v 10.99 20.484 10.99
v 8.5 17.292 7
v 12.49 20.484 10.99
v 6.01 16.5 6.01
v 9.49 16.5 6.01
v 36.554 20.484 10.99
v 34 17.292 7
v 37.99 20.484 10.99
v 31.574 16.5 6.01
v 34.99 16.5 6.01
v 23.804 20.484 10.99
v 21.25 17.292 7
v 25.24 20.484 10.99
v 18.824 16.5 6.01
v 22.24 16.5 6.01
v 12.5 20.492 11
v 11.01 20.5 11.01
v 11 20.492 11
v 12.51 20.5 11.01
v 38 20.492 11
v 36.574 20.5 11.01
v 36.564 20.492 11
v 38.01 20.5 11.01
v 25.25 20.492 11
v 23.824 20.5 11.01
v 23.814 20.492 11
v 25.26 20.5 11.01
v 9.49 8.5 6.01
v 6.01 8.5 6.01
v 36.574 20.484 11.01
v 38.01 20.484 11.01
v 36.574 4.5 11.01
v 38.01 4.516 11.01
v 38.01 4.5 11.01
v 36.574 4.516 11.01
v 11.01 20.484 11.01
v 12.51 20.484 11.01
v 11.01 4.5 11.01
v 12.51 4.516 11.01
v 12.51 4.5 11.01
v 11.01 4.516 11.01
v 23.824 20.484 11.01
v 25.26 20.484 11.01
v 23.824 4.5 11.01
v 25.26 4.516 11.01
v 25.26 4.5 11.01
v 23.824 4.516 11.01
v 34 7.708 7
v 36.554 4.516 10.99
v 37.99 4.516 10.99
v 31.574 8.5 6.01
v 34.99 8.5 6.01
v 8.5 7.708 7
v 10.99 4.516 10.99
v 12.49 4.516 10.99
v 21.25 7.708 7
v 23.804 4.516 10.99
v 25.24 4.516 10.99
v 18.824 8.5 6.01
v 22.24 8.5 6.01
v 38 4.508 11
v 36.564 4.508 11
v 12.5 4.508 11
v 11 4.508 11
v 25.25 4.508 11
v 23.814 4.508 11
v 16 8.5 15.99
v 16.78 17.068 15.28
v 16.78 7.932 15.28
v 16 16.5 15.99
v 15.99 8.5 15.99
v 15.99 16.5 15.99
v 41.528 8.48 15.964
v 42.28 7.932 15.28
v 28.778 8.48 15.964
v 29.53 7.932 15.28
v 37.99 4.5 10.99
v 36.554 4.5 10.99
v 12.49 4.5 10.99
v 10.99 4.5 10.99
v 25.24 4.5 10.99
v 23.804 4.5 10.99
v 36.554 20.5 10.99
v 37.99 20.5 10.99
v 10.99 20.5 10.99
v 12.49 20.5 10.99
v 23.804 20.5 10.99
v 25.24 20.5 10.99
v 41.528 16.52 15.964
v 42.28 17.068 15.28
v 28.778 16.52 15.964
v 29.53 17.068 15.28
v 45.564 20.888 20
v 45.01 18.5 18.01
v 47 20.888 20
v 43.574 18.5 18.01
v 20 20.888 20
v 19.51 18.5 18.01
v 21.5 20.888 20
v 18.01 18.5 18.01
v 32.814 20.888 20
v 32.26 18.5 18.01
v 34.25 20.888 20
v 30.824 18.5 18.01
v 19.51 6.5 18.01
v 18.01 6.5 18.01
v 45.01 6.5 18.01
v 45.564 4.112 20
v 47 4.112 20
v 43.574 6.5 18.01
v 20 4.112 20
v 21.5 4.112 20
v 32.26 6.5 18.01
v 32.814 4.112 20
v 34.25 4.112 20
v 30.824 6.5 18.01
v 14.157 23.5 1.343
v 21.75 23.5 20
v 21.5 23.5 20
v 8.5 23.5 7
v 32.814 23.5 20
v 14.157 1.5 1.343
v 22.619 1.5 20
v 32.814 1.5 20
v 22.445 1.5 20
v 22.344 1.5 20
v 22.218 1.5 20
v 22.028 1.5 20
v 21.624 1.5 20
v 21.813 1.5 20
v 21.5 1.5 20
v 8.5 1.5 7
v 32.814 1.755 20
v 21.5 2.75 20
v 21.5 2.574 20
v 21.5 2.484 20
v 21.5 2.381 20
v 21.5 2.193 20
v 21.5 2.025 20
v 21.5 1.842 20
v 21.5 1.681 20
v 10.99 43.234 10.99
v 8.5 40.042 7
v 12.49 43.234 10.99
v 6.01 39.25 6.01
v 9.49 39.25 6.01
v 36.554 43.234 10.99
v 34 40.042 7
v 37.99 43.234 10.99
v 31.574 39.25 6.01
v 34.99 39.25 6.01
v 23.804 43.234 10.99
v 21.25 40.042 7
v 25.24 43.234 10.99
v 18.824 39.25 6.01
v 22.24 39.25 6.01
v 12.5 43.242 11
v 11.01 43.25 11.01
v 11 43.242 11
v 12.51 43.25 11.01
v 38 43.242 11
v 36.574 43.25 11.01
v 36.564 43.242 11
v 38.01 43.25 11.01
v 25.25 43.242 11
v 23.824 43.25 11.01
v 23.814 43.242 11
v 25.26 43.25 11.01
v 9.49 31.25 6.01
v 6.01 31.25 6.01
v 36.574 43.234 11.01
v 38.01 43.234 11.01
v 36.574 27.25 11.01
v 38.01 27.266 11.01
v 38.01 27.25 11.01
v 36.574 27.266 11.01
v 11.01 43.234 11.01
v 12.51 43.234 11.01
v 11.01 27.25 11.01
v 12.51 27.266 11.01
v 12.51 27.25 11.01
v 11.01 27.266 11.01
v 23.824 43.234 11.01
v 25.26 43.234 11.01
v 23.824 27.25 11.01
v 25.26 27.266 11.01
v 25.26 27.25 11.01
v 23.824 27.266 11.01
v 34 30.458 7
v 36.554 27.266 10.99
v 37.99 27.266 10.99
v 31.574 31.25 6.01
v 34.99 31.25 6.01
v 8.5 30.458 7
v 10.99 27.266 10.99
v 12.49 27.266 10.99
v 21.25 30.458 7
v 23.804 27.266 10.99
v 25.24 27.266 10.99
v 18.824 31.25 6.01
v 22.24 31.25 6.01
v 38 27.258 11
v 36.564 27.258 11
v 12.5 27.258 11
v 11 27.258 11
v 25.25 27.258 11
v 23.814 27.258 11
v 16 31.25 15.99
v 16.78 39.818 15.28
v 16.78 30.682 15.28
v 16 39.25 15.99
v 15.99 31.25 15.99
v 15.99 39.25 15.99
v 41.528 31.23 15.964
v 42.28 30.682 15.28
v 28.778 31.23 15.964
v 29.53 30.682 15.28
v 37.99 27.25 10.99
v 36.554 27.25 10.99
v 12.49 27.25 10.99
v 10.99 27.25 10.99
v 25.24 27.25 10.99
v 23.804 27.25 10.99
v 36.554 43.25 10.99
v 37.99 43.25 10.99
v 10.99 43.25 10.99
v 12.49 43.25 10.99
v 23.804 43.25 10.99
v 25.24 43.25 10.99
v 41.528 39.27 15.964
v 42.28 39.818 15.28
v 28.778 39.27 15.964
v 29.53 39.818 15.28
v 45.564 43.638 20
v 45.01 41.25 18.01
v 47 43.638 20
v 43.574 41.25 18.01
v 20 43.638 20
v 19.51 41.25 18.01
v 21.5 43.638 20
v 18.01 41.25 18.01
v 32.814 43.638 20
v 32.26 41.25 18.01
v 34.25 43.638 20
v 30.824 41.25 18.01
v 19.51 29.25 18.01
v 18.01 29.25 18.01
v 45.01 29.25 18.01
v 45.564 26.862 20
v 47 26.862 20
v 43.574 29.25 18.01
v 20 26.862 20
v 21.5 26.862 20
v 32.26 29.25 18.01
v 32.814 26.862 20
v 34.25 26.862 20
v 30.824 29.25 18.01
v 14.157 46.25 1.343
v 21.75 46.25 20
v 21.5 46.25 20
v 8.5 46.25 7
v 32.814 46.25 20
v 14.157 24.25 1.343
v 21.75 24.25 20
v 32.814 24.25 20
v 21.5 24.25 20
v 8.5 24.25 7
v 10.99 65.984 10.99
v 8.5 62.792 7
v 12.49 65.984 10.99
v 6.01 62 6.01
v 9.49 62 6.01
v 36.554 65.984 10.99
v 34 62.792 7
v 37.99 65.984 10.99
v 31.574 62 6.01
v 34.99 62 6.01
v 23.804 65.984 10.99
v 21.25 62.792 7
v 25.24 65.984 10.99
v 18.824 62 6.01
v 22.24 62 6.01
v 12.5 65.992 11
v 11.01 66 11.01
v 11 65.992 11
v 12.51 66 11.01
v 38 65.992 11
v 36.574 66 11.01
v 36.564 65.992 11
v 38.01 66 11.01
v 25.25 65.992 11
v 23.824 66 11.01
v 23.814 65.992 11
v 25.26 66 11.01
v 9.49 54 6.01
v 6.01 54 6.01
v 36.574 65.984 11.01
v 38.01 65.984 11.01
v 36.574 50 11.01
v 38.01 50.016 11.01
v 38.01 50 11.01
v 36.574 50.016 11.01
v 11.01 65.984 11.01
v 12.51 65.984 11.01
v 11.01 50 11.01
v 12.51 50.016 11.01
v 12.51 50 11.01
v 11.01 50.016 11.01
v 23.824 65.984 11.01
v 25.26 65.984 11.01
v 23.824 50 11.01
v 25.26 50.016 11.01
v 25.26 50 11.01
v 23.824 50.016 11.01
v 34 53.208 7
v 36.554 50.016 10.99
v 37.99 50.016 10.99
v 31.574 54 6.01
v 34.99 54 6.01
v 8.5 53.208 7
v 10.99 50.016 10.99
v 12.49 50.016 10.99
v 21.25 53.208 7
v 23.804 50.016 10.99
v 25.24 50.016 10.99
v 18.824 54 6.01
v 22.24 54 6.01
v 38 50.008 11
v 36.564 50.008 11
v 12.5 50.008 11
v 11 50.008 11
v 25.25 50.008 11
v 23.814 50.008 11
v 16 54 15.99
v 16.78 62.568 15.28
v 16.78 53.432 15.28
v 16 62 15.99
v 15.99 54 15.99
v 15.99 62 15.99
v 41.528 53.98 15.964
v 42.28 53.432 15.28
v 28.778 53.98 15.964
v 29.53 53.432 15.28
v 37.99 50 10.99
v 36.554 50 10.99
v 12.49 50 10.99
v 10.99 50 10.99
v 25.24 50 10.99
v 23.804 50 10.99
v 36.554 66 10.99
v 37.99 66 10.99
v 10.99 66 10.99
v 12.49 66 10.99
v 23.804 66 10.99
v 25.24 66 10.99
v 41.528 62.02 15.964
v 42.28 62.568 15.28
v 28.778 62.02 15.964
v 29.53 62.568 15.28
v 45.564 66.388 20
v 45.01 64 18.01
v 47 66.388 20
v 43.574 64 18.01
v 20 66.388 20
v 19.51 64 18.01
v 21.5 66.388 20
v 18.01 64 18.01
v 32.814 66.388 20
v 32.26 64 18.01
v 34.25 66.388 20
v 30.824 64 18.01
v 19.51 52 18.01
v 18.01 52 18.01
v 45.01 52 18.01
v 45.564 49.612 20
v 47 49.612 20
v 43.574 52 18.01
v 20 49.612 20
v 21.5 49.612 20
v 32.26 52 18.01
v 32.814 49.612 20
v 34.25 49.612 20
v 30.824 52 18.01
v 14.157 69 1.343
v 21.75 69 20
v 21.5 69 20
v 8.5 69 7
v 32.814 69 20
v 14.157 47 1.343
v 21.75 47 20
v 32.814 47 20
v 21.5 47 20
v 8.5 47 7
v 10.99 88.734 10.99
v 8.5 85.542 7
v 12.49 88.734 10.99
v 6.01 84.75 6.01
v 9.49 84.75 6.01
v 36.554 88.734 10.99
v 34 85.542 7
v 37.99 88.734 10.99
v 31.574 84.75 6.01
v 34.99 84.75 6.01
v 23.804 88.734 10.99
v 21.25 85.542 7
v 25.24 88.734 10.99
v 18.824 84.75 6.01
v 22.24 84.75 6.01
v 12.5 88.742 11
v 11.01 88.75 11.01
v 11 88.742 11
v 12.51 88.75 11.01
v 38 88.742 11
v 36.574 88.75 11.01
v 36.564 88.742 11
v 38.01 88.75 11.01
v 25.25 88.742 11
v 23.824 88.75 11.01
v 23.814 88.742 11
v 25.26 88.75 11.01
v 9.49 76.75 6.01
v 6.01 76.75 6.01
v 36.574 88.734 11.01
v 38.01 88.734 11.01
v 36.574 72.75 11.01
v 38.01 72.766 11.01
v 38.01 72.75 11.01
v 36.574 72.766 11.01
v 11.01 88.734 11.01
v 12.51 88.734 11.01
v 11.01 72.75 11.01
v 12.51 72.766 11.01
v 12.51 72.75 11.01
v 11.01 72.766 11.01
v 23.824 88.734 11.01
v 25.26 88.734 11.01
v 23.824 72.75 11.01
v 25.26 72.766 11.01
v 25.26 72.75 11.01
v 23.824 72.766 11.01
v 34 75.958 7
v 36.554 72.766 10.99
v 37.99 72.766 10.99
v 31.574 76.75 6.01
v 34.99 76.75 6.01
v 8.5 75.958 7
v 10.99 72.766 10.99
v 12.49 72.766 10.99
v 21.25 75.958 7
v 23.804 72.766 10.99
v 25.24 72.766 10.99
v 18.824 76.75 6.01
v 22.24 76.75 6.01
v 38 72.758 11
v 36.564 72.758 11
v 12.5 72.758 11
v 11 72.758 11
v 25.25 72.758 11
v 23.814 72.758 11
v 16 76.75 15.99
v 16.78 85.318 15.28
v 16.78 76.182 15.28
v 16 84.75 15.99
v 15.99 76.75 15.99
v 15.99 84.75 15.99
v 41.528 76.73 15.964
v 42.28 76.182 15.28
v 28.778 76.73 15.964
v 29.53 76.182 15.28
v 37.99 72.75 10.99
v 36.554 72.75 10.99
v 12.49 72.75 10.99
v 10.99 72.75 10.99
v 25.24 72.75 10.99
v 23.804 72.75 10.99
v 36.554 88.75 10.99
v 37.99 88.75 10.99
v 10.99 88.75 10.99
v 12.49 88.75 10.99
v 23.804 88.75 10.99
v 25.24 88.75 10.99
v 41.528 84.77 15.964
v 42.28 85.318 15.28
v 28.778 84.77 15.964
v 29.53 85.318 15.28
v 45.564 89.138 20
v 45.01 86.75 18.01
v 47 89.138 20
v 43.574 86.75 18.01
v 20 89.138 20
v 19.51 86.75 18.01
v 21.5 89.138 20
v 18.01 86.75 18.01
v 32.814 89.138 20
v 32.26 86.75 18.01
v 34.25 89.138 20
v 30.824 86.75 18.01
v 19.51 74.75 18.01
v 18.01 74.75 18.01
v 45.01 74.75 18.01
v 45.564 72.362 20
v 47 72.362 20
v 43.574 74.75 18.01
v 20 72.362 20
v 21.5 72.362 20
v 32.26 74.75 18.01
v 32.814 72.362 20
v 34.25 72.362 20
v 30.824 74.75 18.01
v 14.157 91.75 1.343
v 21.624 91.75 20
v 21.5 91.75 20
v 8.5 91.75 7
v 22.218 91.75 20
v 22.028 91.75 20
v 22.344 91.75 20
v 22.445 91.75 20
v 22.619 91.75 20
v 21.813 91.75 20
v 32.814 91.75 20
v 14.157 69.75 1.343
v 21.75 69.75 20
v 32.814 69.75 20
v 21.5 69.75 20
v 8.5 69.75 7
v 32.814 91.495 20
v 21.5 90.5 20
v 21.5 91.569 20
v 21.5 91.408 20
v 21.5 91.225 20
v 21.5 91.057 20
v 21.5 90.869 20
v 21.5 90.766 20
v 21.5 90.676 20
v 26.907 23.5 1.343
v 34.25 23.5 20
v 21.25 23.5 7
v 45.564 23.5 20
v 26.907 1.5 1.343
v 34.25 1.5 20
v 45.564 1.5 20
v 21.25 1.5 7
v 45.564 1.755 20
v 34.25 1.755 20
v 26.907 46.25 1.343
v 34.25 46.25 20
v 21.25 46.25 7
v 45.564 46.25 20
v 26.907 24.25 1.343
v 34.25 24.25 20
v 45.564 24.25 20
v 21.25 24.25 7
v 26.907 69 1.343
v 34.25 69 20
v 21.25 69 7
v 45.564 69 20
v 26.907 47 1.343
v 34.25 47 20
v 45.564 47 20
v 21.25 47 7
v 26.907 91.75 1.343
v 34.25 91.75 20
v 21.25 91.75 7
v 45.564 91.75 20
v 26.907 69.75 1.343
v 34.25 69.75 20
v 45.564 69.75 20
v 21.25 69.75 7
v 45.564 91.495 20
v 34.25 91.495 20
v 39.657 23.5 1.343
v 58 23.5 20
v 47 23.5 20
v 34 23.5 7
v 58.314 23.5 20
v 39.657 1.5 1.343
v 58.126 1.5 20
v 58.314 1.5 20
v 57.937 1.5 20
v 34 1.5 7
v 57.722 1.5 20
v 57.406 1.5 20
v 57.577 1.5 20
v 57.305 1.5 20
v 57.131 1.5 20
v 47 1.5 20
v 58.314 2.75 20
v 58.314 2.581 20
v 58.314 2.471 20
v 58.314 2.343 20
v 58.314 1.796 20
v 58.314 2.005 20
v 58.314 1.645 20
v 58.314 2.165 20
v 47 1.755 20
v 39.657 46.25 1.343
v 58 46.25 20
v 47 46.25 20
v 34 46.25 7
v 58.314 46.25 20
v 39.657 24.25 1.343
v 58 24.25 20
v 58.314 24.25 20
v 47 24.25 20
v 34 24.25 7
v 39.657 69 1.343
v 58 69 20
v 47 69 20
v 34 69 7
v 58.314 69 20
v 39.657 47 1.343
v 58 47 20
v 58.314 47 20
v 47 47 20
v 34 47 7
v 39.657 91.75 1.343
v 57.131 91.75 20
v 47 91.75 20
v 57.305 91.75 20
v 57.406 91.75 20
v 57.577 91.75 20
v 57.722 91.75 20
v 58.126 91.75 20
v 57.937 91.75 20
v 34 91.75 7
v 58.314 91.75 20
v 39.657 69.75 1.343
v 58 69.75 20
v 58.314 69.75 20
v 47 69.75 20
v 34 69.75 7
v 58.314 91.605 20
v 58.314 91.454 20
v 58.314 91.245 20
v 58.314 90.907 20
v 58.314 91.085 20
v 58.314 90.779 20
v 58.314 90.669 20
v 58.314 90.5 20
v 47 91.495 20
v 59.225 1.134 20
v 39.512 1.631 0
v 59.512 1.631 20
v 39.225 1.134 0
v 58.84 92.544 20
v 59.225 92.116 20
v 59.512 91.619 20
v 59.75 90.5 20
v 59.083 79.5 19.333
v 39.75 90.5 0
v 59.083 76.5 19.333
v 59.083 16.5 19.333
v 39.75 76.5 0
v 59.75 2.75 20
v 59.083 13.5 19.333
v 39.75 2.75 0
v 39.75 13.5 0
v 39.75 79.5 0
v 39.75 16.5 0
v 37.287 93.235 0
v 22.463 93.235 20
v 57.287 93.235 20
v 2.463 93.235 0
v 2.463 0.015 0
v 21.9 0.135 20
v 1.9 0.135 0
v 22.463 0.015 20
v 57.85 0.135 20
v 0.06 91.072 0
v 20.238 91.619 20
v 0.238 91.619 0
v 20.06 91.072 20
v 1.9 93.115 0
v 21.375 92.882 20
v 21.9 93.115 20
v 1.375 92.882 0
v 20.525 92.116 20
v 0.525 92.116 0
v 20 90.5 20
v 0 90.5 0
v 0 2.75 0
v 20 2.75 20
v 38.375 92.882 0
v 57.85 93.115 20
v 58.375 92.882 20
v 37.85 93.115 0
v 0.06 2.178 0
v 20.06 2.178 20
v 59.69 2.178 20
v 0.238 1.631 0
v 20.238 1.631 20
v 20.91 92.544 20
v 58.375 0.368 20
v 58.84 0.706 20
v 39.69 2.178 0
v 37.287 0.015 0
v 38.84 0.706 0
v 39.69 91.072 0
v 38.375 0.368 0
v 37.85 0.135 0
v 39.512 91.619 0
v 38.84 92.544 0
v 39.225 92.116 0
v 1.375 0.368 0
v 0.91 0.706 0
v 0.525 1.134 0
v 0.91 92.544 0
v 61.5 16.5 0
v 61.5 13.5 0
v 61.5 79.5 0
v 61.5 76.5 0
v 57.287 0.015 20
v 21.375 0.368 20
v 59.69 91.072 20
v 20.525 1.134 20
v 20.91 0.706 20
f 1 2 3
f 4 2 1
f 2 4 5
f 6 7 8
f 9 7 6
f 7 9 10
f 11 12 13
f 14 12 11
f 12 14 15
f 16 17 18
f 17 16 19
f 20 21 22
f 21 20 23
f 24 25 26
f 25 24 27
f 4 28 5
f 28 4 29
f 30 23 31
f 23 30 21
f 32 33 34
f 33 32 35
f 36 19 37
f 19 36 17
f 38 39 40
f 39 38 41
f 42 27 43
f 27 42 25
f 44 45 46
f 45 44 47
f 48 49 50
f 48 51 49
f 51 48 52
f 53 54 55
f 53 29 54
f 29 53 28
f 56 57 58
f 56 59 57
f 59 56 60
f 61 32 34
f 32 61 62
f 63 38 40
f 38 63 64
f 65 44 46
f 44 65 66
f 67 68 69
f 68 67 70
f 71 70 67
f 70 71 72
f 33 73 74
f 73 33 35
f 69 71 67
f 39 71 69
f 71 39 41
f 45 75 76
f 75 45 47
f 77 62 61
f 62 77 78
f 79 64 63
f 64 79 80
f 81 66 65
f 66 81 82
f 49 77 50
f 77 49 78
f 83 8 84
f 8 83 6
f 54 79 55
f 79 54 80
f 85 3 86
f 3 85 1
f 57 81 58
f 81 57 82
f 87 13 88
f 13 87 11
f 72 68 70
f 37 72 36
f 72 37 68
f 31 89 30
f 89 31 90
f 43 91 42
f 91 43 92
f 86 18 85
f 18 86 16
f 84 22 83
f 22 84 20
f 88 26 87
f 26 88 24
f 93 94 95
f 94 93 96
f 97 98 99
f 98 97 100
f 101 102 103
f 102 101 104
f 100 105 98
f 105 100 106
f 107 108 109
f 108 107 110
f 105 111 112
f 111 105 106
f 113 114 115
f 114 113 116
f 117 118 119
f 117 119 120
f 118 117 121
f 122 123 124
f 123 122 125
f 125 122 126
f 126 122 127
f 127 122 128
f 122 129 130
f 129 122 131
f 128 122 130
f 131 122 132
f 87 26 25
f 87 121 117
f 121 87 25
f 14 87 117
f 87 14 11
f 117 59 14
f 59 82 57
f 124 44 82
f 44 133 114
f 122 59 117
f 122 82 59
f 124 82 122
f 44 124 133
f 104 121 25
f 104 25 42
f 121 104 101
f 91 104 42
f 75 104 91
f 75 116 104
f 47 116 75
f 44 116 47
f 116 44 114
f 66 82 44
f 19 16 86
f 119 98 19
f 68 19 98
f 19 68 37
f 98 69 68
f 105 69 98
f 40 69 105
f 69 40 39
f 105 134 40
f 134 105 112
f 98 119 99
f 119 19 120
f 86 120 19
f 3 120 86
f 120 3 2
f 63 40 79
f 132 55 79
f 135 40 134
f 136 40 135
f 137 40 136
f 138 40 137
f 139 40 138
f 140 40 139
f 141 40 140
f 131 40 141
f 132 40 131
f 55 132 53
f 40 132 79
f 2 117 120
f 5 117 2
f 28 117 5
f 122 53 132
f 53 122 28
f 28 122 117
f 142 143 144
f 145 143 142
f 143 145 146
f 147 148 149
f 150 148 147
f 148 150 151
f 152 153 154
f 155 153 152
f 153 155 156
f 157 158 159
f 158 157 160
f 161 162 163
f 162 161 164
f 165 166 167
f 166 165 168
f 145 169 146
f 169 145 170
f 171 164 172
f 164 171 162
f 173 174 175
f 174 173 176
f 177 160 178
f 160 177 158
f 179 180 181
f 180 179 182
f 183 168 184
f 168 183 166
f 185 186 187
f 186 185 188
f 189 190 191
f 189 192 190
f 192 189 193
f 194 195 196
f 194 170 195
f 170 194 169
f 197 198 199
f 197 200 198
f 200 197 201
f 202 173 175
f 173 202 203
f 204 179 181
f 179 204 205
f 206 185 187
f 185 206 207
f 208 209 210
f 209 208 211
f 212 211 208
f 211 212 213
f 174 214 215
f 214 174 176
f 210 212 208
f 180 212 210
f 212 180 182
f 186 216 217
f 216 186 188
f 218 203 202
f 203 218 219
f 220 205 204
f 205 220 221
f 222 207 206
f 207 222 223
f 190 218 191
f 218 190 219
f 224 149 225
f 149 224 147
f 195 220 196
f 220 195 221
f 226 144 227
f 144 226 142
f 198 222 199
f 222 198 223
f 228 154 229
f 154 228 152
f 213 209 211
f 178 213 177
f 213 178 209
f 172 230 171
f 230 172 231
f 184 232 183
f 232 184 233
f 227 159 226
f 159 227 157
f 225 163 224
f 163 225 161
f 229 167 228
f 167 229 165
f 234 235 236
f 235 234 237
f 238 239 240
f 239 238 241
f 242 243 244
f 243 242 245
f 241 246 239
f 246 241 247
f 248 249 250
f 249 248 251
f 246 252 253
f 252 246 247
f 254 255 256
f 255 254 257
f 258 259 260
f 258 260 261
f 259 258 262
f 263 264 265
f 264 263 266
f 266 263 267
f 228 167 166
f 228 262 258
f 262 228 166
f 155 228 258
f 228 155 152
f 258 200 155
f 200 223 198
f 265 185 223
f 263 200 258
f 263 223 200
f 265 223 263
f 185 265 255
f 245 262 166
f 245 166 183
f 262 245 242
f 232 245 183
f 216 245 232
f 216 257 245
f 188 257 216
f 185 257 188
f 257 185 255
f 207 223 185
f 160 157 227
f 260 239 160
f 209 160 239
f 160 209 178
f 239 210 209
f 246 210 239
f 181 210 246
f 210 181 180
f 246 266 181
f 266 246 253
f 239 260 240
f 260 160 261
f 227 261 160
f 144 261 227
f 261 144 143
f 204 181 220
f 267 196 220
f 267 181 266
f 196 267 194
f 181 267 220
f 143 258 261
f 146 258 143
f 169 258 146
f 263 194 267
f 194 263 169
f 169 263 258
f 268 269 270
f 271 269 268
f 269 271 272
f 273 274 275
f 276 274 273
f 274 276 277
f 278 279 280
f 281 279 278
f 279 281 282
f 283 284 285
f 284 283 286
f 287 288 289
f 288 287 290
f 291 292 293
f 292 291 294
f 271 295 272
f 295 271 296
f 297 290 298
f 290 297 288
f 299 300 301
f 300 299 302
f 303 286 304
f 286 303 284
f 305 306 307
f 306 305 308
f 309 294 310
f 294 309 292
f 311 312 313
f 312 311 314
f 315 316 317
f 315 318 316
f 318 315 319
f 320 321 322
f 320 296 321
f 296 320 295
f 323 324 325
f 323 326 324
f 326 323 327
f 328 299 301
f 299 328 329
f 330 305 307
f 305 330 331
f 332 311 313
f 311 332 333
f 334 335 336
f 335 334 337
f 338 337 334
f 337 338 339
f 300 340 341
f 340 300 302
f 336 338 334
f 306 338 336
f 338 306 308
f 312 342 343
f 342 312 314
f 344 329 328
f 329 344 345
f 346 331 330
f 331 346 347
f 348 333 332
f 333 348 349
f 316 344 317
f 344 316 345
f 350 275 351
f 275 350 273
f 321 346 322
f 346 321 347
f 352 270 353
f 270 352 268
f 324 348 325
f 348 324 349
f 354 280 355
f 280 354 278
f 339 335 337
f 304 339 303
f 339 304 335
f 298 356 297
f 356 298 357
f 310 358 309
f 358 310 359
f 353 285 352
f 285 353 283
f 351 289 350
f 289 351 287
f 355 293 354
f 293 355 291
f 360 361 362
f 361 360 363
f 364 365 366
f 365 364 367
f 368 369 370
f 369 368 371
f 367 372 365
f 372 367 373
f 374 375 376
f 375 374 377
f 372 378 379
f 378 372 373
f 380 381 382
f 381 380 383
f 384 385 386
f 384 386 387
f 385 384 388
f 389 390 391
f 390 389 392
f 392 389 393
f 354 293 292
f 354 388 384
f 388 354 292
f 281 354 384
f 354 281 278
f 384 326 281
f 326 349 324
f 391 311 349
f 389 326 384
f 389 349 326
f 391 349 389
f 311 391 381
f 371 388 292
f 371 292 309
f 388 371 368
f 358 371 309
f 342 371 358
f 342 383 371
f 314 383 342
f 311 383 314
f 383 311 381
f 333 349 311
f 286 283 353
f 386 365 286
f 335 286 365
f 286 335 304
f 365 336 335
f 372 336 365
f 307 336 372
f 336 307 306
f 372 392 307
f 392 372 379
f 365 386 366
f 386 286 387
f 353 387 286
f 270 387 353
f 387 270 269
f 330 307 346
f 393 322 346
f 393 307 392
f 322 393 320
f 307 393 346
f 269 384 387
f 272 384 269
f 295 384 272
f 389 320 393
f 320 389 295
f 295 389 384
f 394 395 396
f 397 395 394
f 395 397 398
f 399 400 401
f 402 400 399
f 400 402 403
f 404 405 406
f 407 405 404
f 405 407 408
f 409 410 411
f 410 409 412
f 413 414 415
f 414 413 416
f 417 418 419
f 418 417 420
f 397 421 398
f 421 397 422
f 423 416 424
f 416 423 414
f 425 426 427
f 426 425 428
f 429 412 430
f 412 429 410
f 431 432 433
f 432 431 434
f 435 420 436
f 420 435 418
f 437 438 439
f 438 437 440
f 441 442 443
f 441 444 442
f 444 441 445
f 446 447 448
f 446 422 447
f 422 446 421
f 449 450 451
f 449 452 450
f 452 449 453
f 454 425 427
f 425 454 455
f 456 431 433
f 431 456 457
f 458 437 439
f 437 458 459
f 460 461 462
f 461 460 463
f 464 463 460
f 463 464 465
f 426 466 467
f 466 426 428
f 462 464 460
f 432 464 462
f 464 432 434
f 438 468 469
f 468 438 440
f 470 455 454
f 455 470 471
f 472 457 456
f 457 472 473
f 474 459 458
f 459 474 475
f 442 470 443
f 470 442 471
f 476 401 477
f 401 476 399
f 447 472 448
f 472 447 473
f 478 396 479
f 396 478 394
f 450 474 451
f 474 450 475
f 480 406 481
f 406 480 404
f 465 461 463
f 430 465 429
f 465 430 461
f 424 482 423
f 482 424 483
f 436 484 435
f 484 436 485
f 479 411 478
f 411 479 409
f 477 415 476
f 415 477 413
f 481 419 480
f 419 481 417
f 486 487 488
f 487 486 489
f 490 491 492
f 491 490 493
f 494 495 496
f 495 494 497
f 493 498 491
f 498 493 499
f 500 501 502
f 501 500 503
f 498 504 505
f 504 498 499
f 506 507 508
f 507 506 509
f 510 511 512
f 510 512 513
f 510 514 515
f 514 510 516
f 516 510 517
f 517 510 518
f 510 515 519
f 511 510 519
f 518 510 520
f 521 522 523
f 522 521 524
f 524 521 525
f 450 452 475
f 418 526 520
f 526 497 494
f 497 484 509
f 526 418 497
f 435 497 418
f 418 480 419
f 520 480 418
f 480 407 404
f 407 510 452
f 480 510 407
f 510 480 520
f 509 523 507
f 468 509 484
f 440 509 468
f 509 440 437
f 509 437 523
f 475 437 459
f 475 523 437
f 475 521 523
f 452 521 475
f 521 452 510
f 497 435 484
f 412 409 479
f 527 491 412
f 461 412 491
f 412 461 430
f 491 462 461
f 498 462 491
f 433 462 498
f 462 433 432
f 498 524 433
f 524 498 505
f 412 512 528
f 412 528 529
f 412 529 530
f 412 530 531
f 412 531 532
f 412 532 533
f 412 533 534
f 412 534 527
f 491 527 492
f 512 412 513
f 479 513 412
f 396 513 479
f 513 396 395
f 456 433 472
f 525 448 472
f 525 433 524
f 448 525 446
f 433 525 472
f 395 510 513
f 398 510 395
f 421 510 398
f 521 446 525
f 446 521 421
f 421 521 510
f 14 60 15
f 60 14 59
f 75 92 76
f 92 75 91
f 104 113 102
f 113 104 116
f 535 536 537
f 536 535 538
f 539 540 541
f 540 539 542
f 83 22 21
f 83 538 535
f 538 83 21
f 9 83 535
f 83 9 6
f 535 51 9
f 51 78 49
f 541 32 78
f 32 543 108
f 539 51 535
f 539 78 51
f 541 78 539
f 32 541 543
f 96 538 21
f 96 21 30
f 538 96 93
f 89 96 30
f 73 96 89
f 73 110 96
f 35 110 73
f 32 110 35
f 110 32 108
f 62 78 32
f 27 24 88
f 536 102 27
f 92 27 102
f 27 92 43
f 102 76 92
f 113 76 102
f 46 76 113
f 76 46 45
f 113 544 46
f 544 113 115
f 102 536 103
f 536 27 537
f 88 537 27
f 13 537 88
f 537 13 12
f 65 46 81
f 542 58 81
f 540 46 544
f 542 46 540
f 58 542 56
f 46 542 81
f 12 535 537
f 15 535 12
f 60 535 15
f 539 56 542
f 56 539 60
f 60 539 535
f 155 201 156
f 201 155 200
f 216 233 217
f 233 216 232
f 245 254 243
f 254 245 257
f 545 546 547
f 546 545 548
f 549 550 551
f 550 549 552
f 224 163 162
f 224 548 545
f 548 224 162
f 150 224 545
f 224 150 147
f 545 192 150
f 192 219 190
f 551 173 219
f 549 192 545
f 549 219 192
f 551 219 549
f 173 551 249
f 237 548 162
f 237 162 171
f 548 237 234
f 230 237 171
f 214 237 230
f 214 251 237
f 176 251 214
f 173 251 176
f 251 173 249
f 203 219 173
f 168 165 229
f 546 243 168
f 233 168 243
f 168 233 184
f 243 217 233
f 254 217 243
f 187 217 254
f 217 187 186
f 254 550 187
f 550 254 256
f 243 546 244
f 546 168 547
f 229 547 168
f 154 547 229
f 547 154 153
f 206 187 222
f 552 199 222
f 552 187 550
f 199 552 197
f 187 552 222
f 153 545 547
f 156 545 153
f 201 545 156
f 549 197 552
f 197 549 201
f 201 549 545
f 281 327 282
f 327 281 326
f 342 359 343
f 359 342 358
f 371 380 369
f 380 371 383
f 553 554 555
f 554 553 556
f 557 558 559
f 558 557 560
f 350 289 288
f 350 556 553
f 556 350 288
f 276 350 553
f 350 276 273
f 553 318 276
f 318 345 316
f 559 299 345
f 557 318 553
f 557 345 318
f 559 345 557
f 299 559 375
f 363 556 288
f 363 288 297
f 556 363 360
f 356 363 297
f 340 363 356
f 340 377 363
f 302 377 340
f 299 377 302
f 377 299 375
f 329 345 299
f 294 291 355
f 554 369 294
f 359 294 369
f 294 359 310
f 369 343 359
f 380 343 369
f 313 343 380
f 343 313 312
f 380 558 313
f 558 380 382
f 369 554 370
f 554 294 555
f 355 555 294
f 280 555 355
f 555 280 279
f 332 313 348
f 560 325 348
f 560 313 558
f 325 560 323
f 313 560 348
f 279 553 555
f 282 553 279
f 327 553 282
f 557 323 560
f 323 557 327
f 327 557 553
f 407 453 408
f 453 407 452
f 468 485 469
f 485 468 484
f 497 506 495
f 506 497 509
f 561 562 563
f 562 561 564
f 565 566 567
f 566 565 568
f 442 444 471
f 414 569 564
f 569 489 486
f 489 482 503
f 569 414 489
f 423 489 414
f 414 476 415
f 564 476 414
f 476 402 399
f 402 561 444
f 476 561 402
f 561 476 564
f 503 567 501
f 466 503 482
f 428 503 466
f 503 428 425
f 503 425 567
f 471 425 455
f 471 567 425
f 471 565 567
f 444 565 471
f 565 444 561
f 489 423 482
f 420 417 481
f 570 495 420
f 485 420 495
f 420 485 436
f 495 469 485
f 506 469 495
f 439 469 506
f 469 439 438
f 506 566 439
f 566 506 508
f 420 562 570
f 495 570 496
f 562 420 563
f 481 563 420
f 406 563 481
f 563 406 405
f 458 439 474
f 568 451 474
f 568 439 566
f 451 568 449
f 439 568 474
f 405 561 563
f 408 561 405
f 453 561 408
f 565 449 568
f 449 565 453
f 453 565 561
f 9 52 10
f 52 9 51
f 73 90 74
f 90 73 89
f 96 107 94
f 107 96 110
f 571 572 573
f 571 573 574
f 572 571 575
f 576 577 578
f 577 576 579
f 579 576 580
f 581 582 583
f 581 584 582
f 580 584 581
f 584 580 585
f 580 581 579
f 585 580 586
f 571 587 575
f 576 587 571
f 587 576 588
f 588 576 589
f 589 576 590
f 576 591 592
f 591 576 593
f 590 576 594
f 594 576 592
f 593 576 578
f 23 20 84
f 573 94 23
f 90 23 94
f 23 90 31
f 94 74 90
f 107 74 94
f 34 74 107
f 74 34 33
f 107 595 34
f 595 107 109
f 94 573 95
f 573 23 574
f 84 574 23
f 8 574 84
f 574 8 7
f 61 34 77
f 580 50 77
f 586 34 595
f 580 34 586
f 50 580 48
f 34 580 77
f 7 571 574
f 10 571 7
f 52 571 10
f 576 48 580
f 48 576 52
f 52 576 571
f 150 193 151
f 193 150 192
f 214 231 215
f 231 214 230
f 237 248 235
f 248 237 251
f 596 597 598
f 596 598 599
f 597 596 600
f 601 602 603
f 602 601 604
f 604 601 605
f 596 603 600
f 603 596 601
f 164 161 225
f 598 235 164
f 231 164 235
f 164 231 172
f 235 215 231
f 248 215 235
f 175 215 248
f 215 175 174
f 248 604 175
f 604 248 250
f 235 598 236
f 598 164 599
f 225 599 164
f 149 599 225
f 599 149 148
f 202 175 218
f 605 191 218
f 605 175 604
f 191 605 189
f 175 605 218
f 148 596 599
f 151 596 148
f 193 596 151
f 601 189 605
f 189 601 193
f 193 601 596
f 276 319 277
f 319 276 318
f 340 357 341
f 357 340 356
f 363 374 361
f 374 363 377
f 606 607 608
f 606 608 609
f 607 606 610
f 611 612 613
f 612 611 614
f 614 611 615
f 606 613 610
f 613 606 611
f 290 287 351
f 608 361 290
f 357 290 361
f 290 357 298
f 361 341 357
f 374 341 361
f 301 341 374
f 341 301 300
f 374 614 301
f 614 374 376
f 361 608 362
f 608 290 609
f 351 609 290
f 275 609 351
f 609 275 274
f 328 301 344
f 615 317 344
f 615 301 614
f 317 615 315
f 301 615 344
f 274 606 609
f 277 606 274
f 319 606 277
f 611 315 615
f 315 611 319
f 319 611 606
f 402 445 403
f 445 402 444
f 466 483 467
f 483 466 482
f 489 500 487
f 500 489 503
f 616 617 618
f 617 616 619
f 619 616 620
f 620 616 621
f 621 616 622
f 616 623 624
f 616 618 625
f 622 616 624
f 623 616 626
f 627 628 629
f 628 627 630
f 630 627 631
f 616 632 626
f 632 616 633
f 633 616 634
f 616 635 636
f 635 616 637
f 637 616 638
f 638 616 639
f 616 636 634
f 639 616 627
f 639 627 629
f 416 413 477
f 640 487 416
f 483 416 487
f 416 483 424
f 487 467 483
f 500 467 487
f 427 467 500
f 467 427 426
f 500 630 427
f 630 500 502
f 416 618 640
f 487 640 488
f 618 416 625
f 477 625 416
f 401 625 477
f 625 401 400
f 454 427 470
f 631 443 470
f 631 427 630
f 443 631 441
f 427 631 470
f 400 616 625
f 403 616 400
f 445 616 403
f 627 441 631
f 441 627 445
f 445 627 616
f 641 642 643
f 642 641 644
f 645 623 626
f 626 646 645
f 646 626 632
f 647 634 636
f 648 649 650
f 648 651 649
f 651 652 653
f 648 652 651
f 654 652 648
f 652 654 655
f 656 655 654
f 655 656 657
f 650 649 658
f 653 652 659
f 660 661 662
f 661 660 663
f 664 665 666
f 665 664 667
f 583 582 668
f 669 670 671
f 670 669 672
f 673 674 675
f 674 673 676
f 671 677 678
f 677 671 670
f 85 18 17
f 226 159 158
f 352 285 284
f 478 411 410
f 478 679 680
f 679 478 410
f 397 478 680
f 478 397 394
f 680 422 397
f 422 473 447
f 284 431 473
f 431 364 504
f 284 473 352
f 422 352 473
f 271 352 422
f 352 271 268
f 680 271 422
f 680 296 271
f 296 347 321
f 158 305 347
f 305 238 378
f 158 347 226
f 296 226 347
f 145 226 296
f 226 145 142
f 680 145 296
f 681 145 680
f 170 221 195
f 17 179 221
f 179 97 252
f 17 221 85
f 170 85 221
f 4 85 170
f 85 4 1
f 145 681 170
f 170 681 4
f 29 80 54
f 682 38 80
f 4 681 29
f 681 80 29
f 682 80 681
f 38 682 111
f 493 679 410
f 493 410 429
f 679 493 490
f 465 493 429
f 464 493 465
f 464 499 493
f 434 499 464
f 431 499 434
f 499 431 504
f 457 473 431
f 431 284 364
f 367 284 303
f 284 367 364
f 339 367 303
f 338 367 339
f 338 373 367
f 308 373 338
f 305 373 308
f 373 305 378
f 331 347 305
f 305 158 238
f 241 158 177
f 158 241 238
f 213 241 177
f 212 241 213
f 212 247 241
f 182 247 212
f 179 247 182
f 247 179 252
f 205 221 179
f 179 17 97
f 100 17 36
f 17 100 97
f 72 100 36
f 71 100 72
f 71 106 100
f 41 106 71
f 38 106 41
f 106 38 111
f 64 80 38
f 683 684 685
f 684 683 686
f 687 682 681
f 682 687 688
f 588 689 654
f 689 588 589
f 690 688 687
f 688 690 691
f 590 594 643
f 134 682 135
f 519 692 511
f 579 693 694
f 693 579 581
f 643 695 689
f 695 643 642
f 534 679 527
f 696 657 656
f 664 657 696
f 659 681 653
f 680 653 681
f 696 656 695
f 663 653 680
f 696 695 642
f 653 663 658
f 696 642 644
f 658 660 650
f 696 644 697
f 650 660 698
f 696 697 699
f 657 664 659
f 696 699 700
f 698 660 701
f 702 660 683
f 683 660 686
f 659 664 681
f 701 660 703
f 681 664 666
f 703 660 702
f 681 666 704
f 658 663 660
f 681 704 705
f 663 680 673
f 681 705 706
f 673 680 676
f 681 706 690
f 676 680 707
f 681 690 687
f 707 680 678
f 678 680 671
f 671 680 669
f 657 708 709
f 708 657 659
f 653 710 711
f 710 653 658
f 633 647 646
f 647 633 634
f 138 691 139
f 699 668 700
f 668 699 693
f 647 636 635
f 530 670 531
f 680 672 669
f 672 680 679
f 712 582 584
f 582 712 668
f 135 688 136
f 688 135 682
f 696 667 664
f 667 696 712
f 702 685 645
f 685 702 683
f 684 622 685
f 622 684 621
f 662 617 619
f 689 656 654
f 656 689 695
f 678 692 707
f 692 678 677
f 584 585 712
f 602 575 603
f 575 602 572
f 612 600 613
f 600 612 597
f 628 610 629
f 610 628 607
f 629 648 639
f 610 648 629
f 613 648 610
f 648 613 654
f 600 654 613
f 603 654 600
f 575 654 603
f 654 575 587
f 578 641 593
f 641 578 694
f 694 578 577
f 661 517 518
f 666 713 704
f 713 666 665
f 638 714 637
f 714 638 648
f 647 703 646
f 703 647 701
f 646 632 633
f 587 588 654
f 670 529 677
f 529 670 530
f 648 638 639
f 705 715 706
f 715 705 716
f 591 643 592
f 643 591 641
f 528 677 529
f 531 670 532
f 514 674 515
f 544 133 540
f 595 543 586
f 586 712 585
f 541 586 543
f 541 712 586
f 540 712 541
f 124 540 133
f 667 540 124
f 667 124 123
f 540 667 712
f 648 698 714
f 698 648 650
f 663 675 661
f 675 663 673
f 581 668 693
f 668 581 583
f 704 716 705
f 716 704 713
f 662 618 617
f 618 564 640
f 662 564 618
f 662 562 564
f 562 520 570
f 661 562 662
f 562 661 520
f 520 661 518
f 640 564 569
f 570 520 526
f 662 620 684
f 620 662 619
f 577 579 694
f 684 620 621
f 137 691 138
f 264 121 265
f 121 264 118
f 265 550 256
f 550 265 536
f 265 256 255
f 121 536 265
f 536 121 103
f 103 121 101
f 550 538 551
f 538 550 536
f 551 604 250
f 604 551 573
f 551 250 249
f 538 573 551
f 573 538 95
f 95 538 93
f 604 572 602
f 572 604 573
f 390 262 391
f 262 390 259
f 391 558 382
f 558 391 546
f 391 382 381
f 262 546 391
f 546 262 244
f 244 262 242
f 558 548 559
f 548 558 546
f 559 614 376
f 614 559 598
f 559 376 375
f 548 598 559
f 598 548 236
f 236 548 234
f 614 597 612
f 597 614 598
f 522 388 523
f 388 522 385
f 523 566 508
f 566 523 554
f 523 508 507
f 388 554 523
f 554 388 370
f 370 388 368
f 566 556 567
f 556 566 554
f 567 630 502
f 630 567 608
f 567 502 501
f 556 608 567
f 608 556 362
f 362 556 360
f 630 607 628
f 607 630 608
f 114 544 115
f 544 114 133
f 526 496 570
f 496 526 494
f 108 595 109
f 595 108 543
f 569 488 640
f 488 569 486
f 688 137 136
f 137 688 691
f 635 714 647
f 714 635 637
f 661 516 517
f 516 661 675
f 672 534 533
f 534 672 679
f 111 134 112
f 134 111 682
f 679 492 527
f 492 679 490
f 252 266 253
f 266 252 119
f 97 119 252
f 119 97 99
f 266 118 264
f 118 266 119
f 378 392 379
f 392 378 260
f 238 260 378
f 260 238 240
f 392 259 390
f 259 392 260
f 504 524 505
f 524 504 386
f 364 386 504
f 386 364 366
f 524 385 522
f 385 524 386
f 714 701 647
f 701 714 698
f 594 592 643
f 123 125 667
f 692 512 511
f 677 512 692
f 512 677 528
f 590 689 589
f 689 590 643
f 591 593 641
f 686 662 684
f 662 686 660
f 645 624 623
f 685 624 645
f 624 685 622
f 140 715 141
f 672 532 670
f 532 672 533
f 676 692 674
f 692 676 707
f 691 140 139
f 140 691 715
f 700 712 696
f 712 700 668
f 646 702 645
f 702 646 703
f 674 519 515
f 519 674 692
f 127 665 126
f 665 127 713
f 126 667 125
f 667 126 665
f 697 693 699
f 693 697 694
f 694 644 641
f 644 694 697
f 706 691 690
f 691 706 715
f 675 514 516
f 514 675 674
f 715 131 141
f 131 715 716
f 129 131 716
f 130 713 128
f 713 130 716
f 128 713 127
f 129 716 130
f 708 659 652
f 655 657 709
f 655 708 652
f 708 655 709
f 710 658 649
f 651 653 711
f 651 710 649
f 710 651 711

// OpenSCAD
AMOUNT_X = 3;
AMOUNT_Y = 4;

/* [Edges] */
INNER_EDGE = 0.75;
OUTER_EDGE_PADDING = 0.75;
OUTER_RADIUS_EMBEDDING = 2;
SLANT_EDGE_PADDING = 0.75;

/* [Gap Size] */
GAP_WIDTH = 22;

/* [Hidden] */
// Perhaps calculate these
SLANT_FULL_HEIGHT = 20;
SLANT_GAP_OFFSET = 7;
SLANT_GAP_WIDTH = 11.25;
SLANT_GAP_WIDTH_INNER = 8;

module casing_rod(total_radius, pos) {
    translate(pos)
    cylinder(0.00001, total_radius, true);
    
    translate(pos + [SLANT_FULL_HEIGHT, 0, SLANT_FULL_HEIGHT])
    cylinder(0.00001, total_radius, true);
}

module casing(depth, width) {
    total_radius = OUTER_EDGE_PADDING + OUTER_RADIUS_EMBEDDING;
    
    width_inner = width;
    width_start = total_radius;
    width_end = width_inner + total_radius - OUTER_RADIUS_EMBEDDING*2;
    
    depth_inner = depth;
    depth_start = total_radius;
    depth_end = depth_inner + total_radius - OUTER_RADIUS_EMBEDDING*2;
    
    $fn = 30;
    hull() {
        casing_rod(total_radius, [depth_start, width_start, 0]);
        casing_rod(total_radius, [depth_start, width_end, 0]);
        
        casing_rod(total_radius, [depth_end, width_start, 0]);
        casing_rod(total_radius, [depth_end, width_end, 0]);
    }
}

module gap_detail_half() {
    translate([0, 0, -2.49])
        linear_extrude(5, scale=2, center=true)
        square([11, 8], true);
}

module gap_detail() {
    gap_detail_half();
    
    mirror([0, 0, 1])
        gap_detail_half();
    
    translate([8, 0, 12])
    scale([1, 1.5, 1])
        gap_detail_half();
}

module gap() {
    rotate(a = 45, v = [0, 1, 0])
        cube([SLANT_GAP_WIDTH_INNER, GAP_WIDTH, 40]);
    
    translate([2, GAP_WIDTH*0.5, 4])
        gap_detail();
}

module gaps() {
    translate([
        SLANT_GAP_OFFSET + OUTER_EDGE_PADDING + INNER_EDGE,
        OUTER_EDGE_PADDING + INNER_EDGE,
        SLANT_GAP_OFFSET
    ])
    for (x = [0:AMOUNT_X-1])
    for (y = [0:AMOUNT_Y-1])
        translate([
            (SLANT_GAP_WIDTH + INNER_EDGE + SLANT_EDGE_PADDING)*x,
            (GAP_WIDTH + INNER_EDGE)*y,
            0
        ])
        gap();
}

module main_case() {
    difference() {
        casing(
            INNER_EDGE +
            (SLANT_GAP_WIDTH + INNER_EDGE + SLANT_EDGE_PADDING)*AMOUNT_X
            - SLANT_EDGE_PADDING,
        
            INNER_EDGE +
            (GAP_WIDTH + INNER_EDGE) * AMOUNT_Y
            
        );
        gaps();
    }
}

module stand_2d() {
    size = SLANT_FULL_HEIGHT*0.75;
    
    polygon(points=[
        [0, 0],
        [1.5*size, 0],
        [SLANT_FULL_HEIGHT, SLANT_FULL_HEIGHT]
    ]);
}

module stand(offse) {
    translate([39, offse, 0])
    rotate(a = 90, v = [1, 0, 0])
        linear_extrude(3, center = true)
        stand_2d();
}

// Finally, the combined model
main_case();
stand(15);
stand(93-15);
